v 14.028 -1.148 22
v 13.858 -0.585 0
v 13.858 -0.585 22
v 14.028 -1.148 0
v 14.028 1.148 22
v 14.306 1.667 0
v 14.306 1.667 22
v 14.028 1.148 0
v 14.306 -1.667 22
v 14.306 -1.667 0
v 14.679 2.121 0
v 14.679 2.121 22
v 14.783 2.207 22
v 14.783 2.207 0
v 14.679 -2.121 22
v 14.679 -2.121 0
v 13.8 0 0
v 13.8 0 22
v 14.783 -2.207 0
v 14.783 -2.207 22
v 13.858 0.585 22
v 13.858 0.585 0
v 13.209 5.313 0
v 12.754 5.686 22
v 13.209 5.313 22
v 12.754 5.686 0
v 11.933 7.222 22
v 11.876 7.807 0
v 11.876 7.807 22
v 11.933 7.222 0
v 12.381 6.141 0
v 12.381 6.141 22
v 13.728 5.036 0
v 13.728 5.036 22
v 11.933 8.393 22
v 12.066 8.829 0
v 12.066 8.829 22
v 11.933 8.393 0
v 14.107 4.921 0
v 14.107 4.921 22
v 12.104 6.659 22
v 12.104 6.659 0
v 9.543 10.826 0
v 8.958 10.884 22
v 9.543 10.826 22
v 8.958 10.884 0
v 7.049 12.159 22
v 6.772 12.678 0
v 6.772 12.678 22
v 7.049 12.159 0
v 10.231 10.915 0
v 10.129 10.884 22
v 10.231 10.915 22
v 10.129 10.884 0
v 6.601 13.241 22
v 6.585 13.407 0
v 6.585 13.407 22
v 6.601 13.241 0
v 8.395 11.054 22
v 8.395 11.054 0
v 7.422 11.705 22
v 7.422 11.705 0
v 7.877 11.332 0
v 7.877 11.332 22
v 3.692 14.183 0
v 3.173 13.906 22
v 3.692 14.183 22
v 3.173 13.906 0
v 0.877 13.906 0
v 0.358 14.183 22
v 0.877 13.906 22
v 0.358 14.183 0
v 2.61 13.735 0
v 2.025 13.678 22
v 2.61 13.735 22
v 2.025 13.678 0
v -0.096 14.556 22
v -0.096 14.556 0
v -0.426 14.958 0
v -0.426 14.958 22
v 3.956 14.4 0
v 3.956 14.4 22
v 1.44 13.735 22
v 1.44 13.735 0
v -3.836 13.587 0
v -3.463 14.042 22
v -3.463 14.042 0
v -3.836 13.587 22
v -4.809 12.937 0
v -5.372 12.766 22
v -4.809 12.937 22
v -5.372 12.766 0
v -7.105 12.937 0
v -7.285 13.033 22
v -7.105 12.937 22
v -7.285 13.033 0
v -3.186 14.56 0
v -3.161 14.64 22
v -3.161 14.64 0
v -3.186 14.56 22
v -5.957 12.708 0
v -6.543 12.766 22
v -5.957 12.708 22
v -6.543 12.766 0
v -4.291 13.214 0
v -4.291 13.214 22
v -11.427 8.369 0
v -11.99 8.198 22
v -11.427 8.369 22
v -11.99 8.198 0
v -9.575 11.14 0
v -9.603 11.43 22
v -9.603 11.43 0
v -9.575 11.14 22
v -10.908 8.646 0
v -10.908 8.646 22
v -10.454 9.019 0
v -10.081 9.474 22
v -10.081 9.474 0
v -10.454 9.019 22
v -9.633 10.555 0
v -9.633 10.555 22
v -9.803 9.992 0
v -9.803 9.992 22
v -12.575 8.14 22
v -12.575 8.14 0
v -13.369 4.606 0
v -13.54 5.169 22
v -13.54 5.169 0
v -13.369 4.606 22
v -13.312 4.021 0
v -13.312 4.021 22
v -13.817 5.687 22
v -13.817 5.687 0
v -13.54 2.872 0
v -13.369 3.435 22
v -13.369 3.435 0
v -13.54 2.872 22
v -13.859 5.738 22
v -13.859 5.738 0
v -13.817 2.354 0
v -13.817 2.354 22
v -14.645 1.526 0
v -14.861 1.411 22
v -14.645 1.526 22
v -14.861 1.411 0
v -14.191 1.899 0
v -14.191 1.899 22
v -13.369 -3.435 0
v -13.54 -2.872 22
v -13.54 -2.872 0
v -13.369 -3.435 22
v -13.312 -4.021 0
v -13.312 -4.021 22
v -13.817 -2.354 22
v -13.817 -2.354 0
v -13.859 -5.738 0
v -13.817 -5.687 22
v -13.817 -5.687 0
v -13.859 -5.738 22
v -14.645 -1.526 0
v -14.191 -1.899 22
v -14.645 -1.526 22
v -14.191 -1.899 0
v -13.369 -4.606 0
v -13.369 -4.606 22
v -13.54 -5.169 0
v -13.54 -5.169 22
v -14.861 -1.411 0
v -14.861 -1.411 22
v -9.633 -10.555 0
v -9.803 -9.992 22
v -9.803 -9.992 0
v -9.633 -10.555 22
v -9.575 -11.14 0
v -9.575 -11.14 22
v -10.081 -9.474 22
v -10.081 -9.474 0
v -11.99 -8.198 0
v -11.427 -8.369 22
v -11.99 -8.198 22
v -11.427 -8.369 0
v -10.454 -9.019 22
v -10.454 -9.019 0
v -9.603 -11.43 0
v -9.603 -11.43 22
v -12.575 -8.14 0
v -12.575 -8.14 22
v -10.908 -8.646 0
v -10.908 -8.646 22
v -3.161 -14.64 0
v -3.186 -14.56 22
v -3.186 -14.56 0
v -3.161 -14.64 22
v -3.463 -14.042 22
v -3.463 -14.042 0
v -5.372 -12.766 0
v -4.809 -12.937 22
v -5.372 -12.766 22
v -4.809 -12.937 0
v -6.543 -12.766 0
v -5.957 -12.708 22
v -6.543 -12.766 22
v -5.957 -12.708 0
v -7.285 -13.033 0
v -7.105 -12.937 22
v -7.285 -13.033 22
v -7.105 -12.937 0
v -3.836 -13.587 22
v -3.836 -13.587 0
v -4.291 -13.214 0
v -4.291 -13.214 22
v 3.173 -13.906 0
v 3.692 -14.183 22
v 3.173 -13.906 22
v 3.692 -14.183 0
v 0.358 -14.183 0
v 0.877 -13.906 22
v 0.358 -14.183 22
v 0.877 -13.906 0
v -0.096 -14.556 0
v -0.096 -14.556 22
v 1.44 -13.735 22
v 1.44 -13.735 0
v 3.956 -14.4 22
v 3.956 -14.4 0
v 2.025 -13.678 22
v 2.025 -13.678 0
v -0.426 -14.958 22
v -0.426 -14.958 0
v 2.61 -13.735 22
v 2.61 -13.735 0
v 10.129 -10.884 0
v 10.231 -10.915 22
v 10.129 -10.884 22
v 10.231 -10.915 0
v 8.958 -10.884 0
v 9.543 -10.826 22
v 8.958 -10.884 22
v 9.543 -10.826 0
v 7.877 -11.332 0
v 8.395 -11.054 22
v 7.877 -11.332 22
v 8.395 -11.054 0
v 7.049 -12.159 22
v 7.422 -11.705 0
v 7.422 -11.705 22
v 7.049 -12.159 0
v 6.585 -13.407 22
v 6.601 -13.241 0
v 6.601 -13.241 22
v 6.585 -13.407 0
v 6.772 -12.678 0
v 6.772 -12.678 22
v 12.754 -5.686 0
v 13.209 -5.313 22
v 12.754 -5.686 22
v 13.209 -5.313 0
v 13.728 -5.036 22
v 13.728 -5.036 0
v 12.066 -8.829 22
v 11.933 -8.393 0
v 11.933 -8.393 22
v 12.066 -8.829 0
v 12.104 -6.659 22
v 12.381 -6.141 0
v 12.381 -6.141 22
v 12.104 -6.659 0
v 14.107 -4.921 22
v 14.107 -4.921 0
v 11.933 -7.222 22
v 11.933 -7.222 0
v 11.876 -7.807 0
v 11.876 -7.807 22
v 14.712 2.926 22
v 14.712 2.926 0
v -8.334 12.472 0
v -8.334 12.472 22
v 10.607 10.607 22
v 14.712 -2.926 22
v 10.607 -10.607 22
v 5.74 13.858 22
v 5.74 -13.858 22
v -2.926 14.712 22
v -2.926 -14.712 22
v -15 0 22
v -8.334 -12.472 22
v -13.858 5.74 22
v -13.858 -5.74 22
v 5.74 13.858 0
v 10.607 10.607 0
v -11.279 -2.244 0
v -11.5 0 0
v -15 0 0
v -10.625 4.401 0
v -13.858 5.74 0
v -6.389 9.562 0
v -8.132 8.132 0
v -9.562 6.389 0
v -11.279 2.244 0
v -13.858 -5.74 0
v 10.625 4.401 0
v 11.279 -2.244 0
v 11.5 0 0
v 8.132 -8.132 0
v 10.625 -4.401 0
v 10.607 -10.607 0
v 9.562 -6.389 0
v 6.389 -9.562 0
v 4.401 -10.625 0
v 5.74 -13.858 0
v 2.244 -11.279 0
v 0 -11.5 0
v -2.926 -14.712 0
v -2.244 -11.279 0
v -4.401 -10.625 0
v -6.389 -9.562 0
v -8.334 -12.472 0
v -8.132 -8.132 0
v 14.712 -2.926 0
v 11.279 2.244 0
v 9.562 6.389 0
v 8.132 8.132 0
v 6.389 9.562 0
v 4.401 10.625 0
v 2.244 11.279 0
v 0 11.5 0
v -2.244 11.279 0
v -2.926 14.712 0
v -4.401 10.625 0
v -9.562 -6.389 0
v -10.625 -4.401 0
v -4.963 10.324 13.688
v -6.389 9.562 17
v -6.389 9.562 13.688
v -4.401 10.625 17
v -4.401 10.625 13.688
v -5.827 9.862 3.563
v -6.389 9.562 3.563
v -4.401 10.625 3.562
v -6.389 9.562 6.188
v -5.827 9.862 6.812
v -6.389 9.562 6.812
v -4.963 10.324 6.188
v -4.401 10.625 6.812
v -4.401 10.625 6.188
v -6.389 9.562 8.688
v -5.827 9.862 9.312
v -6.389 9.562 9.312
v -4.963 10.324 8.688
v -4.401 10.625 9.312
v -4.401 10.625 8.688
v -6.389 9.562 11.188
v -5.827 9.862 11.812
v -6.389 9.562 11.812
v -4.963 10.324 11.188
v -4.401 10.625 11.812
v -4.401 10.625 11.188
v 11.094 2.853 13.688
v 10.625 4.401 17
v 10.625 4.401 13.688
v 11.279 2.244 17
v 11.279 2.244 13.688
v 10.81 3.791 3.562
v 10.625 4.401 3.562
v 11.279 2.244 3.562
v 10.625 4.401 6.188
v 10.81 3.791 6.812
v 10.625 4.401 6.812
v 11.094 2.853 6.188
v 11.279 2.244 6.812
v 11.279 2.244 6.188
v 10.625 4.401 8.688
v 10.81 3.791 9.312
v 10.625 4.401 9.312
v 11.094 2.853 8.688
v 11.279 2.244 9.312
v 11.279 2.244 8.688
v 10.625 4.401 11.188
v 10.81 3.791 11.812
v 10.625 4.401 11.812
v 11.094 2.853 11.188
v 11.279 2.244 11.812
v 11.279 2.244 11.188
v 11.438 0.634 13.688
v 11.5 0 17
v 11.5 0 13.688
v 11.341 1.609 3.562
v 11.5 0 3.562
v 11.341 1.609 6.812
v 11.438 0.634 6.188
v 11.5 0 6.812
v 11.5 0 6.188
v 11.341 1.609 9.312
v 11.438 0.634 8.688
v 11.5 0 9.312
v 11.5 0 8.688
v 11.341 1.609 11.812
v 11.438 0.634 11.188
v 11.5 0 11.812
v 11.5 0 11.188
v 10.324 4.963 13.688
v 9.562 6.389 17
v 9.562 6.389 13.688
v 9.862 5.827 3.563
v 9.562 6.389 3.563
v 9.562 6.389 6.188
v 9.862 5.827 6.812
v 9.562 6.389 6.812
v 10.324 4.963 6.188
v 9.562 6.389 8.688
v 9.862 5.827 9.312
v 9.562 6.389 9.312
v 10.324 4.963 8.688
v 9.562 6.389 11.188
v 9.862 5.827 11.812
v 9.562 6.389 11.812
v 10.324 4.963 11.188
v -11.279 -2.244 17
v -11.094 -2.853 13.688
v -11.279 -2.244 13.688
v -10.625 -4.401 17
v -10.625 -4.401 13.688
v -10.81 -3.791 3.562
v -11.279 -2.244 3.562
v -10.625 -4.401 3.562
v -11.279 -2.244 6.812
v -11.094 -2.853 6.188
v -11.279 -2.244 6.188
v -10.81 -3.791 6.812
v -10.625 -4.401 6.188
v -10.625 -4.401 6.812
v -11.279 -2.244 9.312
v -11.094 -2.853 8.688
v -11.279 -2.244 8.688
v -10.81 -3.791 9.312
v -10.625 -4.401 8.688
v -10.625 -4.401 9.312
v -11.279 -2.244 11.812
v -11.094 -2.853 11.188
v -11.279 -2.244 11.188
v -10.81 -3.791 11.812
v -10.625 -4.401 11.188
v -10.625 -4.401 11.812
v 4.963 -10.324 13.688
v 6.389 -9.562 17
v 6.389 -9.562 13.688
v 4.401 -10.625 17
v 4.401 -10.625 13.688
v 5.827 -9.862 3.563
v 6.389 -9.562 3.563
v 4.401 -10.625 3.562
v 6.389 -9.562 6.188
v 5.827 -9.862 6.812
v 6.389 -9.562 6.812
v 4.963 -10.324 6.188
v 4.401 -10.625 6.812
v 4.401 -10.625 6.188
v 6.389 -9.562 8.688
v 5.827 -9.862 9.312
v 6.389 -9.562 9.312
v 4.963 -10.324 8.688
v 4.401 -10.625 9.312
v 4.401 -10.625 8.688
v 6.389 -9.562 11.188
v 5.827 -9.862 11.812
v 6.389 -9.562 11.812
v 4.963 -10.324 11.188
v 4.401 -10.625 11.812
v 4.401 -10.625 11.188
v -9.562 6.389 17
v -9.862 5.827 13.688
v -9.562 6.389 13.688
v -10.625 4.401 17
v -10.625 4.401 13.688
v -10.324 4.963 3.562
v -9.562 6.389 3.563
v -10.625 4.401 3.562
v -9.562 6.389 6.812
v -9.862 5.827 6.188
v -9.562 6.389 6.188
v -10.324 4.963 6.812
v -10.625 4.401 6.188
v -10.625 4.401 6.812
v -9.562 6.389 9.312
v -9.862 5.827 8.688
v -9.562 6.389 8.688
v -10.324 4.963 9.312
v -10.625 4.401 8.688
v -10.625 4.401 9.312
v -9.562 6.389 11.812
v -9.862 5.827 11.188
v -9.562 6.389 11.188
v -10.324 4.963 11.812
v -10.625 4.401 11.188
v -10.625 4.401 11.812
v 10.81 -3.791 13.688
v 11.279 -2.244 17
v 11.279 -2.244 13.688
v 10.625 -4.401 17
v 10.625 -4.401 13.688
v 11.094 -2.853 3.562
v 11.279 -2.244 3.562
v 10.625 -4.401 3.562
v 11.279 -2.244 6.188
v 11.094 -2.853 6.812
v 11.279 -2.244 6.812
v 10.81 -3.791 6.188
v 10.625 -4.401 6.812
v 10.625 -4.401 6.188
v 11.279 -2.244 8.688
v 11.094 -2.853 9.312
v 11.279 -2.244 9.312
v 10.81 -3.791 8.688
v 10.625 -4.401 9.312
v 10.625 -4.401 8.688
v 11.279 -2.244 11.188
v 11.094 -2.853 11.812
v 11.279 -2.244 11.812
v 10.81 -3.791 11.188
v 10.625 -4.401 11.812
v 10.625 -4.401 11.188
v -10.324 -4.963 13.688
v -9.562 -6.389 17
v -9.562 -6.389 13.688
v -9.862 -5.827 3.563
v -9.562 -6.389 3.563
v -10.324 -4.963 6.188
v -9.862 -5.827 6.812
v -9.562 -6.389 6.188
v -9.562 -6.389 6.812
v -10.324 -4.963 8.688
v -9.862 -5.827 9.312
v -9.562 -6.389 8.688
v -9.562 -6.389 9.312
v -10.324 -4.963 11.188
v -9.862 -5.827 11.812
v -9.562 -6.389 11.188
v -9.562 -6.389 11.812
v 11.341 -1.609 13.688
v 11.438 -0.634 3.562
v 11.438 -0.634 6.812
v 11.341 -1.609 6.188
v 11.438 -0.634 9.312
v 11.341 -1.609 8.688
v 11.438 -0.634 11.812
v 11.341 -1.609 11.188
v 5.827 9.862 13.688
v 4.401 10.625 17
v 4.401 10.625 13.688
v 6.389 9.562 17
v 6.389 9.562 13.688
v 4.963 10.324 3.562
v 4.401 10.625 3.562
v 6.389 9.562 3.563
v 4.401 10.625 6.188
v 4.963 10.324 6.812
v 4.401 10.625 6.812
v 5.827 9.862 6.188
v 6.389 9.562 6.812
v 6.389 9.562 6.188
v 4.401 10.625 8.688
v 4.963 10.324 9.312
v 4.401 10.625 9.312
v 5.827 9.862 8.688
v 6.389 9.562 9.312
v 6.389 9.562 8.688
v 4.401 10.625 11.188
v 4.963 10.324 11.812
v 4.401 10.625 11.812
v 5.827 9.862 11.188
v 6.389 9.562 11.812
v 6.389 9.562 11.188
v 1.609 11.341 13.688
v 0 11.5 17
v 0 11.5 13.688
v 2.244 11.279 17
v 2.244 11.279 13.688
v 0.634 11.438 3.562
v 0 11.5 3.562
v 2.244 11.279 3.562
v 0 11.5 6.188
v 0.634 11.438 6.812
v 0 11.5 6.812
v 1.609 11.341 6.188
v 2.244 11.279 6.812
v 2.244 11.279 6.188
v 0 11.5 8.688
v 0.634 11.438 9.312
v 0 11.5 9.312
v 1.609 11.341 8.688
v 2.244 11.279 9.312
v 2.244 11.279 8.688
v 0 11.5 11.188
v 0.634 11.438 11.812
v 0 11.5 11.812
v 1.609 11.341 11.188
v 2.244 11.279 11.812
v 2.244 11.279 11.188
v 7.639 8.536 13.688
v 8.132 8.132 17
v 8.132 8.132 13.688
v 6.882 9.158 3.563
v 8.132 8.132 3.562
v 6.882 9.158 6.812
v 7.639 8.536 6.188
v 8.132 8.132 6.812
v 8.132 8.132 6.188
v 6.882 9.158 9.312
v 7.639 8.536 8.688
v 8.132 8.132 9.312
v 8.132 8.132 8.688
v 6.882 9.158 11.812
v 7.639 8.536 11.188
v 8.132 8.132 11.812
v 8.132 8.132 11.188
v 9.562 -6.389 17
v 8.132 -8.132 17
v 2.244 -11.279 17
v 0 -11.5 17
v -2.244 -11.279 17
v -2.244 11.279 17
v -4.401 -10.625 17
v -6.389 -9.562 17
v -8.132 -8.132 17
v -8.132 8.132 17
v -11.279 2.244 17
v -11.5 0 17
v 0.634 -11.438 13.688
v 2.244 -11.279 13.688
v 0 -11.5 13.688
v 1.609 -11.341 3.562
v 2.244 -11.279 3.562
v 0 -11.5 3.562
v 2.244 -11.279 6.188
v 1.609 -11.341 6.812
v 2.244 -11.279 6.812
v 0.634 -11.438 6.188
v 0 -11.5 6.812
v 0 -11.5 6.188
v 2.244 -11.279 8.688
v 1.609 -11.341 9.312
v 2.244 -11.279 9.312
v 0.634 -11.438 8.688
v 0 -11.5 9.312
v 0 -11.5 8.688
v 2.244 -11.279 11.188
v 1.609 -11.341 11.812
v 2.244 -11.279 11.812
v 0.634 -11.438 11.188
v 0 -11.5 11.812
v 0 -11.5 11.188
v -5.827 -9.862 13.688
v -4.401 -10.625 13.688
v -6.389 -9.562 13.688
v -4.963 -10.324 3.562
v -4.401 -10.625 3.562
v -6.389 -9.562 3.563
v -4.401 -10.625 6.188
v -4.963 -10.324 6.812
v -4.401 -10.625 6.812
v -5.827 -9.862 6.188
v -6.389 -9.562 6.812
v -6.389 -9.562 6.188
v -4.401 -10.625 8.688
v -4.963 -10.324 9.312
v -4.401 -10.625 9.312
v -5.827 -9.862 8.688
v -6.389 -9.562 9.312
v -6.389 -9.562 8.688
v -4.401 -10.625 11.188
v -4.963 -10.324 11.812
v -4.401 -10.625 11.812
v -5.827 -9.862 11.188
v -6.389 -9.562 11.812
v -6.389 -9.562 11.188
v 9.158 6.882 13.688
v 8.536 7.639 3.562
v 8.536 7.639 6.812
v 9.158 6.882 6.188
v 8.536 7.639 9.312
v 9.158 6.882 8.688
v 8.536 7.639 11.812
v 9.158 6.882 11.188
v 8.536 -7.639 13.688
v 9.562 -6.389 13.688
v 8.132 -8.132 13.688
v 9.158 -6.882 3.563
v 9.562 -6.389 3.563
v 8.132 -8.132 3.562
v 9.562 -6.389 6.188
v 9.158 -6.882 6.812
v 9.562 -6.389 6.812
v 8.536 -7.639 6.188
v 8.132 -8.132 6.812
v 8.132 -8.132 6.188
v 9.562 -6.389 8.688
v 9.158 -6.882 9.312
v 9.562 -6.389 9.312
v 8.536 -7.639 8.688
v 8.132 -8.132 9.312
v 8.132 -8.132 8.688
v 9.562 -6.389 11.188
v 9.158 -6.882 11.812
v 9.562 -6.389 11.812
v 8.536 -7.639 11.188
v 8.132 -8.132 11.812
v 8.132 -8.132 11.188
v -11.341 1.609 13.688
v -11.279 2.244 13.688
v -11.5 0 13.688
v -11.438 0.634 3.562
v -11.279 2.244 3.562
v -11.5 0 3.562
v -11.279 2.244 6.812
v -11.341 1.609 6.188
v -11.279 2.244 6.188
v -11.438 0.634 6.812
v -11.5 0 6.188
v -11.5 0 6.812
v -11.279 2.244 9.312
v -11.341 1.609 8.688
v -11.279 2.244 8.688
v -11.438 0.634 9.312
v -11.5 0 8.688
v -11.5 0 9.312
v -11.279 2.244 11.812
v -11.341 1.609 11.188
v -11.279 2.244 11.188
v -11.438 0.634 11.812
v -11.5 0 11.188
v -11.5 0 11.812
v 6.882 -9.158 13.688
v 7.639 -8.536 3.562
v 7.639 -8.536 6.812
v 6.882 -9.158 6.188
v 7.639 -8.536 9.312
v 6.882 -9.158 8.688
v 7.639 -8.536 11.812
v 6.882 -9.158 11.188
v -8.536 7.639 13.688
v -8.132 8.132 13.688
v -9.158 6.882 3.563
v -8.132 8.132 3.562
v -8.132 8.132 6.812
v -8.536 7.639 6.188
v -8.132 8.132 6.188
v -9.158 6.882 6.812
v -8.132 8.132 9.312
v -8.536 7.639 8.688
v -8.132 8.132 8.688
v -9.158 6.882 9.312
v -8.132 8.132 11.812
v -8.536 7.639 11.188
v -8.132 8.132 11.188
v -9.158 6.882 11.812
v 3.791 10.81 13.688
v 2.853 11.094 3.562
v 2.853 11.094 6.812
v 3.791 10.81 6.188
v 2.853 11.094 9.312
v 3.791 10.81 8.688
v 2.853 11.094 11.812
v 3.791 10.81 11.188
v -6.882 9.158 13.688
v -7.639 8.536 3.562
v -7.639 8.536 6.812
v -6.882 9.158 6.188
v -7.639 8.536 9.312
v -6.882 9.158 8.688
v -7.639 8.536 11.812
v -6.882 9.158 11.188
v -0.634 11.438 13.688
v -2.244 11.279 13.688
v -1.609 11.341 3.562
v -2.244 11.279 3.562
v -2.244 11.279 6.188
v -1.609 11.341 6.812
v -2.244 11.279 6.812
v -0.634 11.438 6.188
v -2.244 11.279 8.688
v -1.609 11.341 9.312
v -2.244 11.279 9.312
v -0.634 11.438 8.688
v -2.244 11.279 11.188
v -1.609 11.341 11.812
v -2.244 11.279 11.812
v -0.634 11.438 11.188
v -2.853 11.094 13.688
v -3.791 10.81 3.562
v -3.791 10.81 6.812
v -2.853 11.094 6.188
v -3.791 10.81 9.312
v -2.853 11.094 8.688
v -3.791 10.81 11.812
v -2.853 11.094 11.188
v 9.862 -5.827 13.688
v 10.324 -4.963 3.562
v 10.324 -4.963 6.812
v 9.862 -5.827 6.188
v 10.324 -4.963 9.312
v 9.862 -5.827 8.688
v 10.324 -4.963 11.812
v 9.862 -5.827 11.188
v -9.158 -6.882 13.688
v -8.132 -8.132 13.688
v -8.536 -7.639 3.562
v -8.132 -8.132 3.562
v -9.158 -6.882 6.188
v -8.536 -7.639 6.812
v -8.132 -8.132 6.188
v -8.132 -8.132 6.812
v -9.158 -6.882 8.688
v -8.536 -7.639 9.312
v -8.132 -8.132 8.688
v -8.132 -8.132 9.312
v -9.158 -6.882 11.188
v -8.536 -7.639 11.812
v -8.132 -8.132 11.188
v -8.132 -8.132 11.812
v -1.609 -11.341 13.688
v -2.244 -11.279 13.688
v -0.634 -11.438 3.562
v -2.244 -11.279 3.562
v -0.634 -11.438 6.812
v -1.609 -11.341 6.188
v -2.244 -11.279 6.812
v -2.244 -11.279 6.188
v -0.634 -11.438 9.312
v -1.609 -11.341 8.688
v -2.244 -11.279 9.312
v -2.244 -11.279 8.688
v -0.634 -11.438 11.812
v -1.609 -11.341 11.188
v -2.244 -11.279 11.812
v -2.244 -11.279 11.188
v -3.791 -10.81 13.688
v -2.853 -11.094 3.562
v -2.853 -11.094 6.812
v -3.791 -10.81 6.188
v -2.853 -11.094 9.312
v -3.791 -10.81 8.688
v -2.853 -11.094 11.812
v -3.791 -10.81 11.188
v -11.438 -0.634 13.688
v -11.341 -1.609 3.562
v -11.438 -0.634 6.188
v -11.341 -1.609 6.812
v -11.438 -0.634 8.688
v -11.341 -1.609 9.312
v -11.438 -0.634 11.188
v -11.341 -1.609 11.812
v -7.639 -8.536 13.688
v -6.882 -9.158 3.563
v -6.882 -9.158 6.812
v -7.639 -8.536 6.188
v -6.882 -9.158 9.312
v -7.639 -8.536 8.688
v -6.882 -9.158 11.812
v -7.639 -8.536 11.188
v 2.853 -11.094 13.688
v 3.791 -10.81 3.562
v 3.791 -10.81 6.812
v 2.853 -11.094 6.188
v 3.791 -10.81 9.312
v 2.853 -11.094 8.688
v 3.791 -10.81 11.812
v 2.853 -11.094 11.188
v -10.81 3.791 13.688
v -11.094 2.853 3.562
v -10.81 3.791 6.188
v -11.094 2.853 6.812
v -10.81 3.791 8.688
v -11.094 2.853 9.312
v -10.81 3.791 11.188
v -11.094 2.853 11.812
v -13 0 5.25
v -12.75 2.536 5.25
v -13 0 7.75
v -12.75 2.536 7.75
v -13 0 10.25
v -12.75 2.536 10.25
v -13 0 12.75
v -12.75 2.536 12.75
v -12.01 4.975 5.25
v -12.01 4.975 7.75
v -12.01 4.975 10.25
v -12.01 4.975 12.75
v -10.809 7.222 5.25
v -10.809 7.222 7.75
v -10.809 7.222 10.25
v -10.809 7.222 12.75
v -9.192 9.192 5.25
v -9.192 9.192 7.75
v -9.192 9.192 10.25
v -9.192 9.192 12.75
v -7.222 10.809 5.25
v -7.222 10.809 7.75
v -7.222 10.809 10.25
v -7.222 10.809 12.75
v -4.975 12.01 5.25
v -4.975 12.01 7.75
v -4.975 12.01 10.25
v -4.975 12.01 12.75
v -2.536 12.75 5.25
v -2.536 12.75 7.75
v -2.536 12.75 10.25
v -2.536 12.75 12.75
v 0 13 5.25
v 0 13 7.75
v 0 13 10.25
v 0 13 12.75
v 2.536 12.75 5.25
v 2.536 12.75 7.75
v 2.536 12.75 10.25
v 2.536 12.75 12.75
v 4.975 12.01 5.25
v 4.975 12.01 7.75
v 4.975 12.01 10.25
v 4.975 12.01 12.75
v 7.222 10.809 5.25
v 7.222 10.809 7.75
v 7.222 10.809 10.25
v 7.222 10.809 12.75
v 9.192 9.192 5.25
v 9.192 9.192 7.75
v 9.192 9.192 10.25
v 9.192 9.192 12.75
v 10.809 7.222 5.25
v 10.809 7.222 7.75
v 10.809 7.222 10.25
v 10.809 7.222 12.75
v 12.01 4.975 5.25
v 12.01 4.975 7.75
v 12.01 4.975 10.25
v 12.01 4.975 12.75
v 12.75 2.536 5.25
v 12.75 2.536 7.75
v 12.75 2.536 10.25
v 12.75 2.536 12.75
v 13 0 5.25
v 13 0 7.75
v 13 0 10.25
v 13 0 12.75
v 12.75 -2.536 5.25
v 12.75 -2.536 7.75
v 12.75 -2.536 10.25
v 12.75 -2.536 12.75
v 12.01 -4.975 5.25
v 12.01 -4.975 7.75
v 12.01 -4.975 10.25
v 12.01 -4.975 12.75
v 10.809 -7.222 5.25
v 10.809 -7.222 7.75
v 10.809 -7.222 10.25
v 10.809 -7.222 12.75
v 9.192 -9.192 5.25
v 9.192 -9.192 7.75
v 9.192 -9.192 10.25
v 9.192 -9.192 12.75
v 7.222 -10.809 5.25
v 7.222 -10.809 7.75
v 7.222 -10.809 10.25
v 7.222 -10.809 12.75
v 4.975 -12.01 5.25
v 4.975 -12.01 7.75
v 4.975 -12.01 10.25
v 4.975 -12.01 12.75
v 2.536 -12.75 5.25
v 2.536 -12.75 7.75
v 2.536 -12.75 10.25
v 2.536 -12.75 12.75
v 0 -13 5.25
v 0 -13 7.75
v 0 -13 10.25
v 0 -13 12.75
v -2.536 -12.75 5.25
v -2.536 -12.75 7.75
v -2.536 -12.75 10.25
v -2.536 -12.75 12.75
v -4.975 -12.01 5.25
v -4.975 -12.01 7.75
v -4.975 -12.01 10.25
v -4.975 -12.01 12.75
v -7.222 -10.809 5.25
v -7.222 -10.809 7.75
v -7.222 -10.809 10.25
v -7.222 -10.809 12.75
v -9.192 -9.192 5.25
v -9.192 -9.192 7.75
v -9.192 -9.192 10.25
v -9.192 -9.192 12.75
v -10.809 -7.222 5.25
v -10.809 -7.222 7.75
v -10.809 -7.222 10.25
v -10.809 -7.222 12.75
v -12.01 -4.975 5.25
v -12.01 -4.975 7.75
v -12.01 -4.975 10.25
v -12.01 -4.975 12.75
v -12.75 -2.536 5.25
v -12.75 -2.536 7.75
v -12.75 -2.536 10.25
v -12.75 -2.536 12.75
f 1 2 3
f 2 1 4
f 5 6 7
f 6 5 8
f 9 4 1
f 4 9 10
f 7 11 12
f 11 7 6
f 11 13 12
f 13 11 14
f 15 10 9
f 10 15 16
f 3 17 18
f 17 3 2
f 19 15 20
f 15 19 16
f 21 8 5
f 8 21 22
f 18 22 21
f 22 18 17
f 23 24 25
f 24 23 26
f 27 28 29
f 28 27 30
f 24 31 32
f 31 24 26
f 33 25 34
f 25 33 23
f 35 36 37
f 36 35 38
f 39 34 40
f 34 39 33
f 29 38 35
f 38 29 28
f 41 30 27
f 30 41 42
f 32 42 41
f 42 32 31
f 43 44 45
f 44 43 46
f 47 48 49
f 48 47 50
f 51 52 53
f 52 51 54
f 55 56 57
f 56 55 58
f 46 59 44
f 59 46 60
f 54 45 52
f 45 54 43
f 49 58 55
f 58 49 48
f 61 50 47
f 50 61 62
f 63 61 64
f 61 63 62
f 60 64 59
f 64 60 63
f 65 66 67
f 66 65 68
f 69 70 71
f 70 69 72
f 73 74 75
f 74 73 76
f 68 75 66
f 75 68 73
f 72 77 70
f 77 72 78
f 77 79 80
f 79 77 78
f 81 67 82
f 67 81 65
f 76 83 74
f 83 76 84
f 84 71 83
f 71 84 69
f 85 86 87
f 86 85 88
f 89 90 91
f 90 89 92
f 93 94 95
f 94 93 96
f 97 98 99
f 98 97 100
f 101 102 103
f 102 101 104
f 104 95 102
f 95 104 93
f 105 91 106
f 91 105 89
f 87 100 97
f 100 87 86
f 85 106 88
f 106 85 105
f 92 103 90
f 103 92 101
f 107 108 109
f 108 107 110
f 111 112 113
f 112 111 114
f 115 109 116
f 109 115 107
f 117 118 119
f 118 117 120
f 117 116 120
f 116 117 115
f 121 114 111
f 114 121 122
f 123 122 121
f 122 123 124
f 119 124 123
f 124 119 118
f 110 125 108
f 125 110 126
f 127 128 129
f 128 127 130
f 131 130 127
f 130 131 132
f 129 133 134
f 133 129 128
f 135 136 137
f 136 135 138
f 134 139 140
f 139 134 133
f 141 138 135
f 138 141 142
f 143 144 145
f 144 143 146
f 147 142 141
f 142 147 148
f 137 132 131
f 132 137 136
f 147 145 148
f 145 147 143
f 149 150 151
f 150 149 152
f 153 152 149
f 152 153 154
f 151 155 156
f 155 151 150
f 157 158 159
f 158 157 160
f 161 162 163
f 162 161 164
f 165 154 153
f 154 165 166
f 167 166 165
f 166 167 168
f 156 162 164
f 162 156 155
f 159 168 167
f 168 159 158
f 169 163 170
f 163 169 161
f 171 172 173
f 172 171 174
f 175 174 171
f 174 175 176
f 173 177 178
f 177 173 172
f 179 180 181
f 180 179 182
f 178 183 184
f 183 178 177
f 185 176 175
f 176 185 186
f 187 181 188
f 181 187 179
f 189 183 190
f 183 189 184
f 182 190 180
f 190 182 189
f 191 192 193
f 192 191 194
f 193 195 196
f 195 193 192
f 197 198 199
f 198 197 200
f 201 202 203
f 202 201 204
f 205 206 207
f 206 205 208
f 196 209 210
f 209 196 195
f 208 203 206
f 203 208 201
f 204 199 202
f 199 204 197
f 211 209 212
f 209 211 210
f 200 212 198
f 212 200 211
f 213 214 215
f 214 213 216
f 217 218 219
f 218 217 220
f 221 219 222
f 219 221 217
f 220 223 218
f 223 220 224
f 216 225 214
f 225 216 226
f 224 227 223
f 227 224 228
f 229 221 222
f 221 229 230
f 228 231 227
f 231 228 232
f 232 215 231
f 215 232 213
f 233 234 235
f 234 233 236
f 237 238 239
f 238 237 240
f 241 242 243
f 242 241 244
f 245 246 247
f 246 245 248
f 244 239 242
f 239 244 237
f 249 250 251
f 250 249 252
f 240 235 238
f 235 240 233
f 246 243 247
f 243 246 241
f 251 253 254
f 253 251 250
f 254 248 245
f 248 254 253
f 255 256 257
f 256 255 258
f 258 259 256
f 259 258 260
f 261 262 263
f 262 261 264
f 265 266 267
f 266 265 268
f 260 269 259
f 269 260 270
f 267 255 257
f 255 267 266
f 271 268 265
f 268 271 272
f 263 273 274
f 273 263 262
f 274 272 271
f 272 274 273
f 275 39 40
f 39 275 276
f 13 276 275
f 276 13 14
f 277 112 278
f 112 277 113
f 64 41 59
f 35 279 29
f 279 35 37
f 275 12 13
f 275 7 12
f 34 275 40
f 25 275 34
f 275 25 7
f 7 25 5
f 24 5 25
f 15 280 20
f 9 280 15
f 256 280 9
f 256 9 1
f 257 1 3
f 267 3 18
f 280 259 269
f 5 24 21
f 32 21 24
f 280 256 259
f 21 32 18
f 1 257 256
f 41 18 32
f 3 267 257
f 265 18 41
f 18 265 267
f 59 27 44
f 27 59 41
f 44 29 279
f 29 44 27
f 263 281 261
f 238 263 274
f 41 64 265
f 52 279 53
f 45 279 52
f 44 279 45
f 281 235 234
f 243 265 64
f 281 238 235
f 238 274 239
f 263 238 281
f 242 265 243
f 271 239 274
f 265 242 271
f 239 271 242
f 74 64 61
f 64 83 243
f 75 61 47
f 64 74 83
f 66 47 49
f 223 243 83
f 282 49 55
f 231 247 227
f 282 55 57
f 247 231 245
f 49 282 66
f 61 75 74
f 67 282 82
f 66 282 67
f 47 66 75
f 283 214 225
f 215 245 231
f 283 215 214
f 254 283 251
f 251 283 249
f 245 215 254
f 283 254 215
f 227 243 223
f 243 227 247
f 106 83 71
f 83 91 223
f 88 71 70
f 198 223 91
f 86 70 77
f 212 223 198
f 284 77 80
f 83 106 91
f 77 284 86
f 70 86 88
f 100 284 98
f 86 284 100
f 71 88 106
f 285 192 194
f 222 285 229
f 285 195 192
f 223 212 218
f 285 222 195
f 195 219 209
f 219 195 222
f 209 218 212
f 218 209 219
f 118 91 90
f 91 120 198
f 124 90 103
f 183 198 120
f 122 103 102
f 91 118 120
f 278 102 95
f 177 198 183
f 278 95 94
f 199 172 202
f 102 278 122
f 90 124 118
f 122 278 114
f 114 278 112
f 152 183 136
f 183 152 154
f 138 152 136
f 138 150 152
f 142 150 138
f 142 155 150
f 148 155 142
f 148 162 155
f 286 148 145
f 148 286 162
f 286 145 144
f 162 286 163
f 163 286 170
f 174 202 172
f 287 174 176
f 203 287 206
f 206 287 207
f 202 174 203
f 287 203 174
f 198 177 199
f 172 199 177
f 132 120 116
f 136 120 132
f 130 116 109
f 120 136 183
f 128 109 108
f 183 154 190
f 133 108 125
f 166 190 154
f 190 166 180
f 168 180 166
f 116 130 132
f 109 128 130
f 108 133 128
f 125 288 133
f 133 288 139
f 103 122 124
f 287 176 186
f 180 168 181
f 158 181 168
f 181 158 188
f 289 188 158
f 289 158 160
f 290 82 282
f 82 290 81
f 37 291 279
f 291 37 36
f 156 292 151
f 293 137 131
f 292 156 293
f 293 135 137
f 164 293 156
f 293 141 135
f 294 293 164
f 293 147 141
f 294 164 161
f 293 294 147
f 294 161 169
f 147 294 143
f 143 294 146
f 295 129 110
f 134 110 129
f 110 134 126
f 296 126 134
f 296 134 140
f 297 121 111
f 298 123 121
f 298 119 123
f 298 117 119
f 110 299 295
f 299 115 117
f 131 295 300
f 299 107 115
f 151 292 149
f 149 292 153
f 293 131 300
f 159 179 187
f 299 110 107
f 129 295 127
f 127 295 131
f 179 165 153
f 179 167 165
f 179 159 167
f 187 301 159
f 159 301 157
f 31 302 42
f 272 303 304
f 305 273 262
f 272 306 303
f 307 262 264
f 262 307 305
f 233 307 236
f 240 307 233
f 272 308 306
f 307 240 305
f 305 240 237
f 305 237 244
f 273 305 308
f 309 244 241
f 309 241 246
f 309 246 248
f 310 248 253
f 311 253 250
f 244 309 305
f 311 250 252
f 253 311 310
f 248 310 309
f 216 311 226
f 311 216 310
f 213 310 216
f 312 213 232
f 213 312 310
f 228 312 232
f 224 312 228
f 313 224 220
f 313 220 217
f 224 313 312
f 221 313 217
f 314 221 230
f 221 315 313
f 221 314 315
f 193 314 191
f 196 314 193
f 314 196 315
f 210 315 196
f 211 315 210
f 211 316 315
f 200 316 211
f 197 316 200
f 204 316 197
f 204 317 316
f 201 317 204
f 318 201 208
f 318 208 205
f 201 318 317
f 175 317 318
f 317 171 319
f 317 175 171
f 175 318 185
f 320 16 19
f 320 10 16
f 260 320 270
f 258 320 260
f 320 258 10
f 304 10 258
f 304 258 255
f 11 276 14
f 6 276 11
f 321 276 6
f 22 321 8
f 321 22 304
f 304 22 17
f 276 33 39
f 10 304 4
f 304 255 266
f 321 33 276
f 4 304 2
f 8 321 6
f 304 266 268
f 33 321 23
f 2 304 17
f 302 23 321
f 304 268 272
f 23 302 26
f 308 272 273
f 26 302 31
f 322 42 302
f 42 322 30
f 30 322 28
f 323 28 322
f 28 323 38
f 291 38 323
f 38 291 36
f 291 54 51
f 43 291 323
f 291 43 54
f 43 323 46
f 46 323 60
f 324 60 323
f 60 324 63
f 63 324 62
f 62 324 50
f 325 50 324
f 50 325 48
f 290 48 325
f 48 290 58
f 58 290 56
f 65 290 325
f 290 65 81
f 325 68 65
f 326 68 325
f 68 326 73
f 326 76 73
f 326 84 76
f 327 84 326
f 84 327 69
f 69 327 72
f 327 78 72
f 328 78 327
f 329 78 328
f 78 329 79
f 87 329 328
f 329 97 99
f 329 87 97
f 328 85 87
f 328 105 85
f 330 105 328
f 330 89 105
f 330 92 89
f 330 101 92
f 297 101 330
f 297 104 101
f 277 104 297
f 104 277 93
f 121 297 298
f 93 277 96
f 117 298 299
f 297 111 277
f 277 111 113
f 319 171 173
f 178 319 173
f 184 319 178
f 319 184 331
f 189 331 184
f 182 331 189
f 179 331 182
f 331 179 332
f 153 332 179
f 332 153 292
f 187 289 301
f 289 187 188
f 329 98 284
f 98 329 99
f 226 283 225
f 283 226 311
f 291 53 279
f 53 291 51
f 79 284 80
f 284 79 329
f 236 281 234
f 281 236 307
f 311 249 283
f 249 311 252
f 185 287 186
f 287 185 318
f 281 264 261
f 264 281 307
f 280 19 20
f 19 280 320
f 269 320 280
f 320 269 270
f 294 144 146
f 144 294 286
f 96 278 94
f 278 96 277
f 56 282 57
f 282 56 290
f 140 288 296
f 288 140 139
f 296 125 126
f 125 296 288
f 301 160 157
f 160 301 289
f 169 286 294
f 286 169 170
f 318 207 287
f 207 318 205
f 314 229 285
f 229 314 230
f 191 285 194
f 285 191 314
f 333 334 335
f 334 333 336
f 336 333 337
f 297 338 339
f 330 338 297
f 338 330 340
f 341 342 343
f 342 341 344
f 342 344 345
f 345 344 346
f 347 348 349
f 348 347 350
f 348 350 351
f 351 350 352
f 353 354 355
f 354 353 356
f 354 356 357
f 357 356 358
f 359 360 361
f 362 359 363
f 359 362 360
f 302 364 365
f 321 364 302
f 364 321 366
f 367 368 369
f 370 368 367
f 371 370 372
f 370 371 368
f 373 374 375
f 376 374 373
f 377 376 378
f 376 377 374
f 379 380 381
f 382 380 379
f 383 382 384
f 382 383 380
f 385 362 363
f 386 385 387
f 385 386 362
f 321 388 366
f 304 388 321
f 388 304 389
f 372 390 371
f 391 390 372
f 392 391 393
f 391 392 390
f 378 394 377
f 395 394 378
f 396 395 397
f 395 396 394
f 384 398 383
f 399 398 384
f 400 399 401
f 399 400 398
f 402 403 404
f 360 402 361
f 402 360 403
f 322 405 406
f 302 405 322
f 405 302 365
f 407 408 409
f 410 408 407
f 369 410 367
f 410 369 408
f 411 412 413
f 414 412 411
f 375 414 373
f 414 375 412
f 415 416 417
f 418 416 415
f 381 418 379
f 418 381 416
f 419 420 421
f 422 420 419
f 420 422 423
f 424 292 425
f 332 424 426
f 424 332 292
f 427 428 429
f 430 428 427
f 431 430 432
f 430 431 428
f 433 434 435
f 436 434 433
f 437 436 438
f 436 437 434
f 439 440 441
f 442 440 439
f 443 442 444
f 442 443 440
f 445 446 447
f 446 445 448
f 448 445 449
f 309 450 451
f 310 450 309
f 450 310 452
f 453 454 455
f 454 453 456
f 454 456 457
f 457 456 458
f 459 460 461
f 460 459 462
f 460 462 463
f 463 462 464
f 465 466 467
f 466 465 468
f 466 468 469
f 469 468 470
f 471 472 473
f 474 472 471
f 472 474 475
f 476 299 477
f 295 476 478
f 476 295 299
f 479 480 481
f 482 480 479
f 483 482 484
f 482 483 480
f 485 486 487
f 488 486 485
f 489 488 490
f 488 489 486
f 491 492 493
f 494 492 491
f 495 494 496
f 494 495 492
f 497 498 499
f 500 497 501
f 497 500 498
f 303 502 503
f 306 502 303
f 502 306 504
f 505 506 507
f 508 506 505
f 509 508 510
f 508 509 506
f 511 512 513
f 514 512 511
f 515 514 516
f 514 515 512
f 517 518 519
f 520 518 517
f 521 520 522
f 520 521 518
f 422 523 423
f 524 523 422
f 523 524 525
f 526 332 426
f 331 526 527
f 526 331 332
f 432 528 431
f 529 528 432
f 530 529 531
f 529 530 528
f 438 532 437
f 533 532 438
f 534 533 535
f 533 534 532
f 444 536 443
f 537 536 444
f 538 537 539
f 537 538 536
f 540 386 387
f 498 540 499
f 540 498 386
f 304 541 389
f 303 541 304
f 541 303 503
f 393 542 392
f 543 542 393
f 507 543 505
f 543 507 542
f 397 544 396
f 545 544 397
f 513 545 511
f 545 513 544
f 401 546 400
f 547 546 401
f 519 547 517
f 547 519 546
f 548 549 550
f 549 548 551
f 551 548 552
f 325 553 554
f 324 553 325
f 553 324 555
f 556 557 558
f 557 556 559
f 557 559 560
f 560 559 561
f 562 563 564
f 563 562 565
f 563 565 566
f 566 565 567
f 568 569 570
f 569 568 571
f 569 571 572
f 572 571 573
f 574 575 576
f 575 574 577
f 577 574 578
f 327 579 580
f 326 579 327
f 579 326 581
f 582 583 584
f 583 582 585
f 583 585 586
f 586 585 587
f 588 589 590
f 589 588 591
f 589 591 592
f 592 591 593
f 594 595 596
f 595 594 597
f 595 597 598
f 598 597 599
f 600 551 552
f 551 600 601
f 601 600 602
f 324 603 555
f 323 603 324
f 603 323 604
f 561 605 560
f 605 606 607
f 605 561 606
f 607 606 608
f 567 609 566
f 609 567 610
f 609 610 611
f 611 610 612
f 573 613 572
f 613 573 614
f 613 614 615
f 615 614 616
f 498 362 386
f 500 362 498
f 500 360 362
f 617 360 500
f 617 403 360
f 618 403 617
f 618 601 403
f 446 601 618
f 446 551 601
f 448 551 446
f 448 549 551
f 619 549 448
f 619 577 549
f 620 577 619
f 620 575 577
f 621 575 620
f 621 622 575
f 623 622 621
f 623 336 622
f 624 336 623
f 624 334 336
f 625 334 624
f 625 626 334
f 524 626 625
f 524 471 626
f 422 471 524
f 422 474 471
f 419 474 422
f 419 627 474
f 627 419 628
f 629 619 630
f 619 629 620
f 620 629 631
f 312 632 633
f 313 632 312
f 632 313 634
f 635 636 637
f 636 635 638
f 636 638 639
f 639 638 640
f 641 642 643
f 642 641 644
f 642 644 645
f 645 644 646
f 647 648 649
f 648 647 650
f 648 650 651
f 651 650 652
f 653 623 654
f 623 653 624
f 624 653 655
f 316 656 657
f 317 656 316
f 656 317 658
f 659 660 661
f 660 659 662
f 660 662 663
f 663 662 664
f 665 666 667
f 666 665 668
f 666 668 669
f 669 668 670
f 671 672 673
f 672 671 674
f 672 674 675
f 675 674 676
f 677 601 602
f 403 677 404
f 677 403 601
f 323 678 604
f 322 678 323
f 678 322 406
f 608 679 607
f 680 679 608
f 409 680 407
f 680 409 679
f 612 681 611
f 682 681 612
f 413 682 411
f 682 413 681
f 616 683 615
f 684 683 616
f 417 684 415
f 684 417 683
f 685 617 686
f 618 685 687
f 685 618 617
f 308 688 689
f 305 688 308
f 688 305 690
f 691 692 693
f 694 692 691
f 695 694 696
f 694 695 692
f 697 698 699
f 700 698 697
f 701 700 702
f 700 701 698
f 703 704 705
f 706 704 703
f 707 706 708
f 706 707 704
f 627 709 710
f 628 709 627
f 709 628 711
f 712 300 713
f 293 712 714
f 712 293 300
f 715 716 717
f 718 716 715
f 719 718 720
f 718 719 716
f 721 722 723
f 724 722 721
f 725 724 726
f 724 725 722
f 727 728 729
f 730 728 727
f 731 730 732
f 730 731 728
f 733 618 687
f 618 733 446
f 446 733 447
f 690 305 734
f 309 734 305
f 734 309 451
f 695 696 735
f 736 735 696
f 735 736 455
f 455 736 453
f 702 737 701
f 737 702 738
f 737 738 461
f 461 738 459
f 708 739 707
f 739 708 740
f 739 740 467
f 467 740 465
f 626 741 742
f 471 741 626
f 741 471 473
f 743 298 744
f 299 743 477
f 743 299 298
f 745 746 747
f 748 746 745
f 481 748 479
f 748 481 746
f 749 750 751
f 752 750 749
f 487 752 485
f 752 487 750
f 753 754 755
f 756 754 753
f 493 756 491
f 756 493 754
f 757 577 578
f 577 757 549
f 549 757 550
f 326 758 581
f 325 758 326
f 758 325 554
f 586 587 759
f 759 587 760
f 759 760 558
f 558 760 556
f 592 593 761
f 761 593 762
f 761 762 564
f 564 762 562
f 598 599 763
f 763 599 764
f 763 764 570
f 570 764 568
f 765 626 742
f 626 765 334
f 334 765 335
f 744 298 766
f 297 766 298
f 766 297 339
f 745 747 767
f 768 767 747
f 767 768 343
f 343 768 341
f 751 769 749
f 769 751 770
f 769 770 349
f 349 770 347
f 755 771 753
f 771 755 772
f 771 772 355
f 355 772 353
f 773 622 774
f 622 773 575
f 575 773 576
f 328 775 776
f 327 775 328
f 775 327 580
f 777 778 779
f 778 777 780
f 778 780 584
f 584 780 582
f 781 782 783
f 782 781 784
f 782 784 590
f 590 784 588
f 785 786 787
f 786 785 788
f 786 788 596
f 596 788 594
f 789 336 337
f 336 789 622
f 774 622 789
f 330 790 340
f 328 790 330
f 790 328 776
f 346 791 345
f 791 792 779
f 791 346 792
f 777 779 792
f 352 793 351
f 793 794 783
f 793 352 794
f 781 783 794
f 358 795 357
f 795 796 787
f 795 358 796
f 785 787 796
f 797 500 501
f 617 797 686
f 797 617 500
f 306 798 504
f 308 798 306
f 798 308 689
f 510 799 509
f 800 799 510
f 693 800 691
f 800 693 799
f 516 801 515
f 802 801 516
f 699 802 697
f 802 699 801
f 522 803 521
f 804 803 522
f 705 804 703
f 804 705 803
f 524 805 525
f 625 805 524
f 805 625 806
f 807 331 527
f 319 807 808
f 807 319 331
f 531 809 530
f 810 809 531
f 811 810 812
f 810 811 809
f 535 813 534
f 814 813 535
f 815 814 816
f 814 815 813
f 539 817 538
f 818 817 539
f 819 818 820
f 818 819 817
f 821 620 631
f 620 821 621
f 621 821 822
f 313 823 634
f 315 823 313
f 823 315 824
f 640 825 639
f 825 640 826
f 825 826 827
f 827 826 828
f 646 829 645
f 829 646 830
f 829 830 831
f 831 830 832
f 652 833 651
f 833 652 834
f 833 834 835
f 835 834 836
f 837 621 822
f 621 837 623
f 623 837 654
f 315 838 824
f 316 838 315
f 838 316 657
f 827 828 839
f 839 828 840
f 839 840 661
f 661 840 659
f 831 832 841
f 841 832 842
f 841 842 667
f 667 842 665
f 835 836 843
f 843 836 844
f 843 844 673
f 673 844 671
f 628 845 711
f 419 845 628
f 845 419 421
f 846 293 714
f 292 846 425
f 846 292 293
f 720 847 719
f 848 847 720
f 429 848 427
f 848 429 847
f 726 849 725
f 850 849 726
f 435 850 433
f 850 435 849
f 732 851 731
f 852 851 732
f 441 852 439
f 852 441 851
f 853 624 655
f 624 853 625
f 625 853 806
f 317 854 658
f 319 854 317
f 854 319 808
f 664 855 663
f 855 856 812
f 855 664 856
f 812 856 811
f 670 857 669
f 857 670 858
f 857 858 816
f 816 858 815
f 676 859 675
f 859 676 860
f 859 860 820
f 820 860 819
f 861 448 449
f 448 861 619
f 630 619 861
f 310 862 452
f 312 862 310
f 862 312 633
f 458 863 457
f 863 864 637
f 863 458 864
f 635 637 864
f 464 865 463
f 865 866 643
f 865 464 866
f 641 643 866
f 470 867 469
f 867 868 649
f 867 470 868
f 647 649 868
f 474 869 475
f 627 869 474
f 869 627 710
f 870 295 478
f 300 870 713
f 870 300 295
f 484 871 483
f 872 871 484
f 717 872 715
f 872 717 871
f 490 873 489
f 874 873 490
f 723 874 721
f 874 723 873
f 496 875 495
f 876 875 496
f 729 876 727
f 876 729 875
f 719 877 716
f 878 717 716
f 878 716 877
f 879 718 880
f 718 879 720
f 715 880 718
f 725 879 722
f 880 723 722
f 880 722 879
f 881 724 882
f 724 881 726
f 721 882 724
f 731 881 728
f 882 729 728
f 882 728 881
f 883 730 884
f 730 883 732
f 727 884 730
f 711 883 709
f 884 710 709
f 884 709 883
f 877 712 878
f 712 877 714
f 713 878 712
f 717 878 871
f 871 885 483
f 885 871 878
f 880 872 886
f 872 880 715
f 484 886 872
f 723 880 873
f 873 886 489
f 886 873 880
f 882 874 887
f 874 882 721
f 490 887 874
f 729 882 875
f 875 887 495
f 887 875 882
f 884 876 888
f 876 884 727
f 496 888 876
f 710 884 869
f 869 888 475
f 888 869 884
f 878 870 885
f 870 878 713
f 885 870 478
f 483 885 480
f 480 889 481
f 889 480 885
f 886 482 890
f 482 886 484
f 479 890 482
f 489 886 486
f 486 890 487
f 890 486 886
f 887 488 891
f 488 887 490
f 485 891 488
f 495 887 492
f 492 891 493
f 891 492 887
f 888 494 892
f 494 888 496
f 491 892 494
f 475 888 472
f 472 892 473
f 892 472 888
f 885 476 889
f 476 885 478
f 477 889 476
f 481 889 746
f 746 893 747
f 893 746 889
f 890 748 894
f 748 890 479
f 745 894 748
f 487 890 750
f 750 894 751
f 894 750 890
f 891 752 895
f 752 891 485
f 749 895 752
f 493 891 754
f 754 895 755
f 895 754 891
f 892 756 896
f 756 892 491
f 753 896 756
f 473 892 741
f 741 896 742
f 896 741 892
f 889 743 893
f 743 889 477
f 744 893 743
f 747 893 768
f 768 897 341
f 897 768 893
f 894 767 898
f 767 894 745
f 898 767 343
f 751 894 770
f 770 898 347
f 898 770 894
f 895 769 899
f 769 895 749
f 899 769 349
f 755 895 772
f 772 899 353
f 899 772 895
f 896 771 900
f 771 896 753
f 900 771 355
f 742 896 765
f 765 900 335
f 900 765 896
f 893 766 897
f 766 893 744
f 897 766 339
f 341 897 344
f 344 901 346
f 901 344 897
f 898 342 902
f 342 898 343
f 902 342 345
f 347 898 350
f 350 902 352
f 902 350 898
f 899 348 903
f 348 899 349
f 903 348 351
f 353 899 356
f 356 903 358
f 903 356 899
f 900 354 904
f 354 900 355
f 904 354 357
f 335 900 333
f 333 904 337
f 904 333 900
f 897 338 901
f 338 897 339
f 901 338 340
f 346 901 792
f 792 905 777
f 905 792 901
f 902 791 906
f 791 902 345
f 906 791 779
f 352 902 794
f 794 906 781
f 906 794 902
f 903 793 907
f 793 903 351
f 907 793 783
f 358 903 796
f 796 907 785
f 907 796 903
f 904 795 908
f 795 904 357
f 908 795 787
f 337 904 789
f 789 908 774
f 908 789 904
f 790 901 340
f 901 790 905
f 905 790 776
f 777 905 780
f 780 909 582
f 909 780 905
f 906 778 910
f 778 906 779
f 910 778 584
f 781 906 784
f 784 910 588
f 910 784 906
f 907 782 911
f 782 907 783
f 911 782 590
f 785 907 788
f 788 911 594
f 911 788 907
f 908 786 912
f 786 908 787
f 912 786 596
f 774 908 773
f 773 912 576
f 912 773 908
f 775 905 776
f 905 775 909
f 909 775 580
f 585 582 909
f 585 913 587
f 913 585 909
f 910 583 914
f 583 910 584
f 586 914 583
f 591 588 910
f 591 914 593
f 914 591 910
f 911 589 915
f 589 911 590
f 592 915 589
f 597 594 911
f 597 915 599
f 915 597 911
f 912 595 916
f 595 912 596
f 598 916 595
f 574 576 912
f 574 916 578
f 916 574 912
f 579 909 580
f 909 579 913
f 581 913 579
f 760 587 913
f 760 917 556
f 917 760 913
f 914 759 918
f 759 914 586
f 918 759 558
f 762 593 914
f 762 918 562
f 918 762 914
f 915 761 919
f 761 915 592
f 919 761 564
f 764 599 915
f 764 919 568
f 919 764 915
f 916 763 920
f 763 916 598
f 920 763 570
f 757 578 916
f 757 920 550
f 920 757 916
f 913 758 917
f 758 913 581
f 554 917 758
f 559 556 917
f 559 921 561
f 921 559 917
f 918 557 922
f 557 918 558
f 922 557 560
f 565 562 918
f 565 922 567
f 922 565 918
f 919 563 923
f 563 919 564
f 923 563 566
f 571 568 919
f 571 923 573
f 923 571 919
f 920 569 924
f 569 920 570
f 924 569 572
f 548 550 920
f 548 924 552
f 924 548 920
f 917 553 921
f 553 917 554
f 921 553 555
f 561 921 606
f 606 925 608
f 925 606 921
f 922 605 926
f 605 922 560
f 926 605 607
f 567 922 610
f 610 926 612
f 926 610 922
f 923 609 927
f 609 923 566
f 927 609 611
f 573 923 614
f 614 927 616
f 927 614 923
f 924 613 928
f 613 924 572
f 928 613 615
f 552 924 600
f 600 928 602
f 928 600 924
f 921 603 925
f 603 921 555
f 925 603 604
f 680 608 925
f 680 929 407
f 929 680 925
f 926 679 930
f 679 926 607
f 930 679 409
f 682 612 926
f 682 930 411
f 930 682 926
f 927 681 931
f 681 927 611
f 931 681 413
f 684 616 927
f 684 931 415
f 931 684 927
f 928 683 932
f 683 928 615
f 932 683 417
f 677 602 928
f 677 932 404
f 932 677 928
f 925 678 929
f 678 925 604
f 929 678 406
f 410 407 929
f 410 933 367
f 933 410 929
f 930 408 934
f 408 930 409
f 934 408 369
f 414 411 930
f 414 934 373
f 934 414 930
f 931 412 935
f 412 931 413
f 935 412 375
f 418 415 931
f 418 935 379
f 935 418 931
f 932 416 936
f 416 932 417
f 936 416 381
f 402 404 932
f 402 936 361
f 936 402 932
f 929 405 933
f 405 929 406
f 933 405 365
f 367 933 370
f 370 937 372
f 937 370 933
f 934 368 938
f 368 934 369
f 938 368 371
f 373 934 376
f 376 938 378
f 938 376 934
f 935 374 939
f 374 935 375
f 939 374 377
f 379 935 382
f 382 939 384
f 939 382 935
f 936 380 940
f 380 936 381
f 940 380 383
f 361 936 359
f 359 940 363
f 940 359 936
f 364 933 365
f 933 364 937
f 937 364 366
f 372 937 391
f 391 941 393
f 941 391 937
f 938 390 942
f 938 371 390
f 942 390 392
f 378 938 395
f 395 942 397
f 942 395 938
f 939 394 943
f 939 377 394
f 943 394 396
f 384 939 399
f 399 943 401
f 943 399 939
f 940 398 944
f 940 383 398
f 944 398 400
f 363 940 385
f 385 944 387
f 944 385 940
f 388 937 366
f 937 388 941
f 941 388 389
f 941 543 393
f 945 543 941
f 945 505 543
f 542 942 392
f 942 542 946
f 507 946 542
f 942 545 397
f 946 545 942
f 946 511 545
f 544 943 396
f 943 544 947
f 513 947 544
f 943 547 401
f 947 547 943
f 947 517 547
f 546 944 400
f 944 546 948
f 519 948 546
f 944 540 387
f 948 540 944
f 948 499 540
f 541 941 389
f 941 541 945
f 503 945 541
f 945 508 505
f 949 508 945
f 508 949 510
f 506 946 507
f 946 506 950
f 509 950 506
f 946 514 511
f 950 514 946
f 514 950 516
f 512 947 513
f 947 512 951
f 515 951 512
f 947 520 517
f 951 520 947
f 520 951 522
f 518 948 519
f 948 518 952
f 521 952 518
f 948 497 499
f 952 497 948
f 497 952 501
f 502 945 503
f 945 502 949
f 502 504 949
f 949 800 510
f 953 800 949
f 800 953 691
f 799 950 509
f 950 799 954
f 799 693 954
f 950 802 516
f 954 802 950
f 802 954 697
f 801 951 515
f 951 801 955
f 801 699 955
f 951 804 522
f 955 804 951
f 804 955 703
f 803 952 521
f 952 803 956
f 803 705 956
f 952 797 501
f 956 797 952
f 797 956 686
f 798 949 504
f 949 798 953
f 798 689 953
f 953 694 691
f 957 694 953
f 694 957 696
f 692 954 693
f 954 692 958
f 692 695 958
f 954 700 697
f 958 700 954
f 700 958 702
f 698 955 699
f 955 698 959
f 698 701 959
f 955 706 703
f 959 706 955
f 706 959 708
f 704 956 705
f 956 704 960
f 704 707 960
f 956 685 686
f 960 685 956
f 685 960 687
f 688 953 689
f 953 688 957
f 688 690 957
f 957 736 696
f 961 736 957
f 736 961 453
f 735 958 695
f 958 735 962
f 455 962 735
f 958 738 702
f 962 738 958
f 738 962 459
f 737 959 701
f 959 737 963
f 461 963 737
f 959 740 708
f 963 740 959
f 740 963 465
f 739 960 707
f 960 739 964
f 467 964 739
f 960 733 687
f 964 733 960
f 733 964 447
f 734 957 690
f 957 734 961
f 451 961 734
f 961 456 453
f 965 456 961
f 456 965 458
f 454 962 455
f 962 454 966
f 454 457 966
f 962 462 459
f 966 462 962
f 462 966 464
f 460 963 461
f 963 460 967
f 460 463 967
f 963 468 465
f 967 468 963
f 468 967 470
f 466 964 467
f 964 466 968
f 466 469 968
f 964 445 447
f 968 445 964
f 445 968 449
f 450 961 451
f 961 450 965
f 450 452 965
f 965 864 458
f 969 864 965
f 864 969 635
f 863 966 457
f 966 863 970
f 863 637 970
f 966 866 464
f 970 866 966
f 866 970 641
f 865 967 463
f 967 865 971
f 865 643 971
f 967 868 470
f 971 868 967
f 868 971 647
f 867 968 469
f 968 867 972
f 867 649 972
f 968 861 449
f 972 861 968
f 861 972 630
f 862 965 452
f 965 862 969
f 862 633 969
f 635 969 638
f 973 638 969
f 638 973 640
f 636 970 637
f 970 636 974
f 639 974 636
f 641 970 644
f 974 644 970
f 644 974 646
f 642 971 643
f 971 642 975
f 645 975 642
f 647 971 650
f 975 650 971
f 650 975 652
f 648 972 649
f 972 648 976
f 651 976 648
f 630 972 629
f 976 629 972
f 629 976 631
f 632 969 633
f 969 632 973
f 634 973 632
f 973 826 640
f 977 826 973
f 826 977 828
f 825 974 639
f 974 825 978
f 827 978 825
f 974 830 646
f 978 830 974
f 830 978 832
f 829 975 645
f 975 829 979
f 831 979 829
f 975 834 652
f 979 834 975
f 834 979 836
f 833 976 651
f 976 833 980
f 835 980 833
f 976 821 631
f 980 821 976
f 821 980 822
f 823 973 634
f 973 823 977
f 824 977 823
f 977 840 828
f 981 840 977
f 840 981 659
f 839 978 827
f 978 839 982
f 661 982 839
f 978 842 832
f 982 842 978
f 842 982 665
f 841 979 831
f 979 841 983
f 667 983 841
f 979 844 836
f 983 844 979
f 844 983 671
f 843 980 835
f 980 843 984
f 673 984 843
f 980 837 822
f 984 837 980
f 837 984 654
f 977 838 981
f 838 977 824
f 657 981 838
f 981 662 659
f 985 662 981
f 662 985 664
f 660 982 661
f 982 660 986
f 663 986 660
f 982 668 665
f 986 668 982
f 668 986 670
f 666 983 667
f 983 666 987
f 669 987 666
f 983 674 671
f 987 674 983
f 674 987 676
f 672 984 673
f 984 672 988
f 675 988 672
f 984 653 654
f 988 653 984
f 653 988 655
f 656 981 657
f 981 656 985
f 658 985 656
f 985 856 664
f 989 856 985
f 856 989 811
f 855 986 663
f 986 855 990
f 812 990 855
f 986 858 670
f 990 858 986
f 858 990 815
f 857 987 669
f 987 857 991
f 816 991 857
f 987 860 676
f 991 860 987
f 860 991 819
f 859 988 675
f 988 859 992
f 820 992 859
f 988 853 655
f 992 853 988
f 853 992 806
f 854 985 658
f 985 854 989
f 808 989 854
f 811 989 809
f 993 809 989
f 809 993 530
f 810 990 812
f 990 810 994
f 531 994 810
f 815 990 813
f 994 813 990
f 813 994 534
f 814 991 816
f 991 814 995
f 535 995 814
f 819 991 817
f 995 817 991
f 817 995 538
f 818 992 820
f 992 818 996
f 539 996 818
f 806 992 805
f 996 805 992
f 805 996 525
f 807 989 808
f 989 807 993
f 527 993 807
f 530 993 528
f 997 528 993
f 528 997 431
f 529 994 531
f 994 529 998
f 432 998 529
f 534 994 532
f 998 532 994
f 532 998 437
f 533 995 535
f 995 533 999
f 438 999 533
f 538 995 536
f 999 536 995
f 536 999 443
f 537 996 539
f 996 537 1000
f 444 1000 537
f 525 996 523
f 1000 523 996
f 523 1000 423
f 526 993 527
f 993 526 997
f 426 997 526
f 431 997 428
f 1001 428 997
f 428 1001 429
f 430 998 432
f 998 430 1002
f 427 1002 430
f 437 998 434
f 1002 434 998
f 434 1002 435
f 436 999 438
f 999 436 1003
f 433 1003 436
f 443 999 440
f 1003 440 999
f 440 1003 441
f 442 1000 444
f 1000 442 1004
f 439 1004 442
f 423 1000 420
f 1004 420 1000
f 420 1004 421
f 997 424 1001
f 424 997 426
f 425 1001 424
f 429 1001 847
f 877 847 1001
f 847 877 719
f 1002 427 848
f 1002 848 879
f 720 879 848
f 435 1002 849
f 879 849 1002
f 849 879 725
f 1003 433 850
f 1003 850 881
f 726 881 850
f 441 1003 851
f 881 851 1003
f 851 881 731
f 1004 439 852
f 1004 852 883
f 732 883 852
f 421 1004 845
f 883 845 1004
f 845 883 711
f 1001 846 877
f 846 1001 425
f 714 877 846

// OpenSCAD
$fn = 32;

// ----------------------------------------------------------------------
// Threaded cap: 30 mm body, 22 mm tall, 23 mm threaded bore
// ----------------------------------------------------------------------

// --- parameters (mm) ---
outer_d = 30;             // cap outside diameter
body_h = 22;              // cap height
top_t = 5;                // closed top thickness
bore_d = 23;              // bore core diameter
pitch = 2.5;              // thread pitch
thread_d = 1.5;           // thread depth
thread_z = 3;             // thread start above the rim
thread_h = 11;            // threaded height
flutes = 13;              // number of knurl flutes
flute_d = 6;              // flute cutter diameter
flute_depth = 1.2;        // flute depth into the rim

difference() {
  union() {
    cylinder(h = 22, d = outer_d);
  }
  /* threaded bore, closed at the top */
  translate([0, 0, -2.5]) cylinder(h = 19.5, d = bore_d);
  translate([0, 0, 3]) rotate_extrude() polygon([[10.5, 0], [10.5, 11], [11, 11], [13, 9.75], [11, 8.5], [13, 7.25], [11, 6], [13, 4.75], [11, 3.5], [13, 2.25], [11, 0], [10.5, 0]]);
  /* knurl flutes around the rim */
  for (i = [0 : flutes - 1]) {
    a = i * 360 / flutes;
    translate([(outer_d / 2 + flute_d / 2 - flute_depth) * cos(a), (outer_d / 2 + flute_d / 2 - flute_depth) * sin(a), -2.5]) cylinder(h = body_h + 5, d = flute_d);
  }
}
